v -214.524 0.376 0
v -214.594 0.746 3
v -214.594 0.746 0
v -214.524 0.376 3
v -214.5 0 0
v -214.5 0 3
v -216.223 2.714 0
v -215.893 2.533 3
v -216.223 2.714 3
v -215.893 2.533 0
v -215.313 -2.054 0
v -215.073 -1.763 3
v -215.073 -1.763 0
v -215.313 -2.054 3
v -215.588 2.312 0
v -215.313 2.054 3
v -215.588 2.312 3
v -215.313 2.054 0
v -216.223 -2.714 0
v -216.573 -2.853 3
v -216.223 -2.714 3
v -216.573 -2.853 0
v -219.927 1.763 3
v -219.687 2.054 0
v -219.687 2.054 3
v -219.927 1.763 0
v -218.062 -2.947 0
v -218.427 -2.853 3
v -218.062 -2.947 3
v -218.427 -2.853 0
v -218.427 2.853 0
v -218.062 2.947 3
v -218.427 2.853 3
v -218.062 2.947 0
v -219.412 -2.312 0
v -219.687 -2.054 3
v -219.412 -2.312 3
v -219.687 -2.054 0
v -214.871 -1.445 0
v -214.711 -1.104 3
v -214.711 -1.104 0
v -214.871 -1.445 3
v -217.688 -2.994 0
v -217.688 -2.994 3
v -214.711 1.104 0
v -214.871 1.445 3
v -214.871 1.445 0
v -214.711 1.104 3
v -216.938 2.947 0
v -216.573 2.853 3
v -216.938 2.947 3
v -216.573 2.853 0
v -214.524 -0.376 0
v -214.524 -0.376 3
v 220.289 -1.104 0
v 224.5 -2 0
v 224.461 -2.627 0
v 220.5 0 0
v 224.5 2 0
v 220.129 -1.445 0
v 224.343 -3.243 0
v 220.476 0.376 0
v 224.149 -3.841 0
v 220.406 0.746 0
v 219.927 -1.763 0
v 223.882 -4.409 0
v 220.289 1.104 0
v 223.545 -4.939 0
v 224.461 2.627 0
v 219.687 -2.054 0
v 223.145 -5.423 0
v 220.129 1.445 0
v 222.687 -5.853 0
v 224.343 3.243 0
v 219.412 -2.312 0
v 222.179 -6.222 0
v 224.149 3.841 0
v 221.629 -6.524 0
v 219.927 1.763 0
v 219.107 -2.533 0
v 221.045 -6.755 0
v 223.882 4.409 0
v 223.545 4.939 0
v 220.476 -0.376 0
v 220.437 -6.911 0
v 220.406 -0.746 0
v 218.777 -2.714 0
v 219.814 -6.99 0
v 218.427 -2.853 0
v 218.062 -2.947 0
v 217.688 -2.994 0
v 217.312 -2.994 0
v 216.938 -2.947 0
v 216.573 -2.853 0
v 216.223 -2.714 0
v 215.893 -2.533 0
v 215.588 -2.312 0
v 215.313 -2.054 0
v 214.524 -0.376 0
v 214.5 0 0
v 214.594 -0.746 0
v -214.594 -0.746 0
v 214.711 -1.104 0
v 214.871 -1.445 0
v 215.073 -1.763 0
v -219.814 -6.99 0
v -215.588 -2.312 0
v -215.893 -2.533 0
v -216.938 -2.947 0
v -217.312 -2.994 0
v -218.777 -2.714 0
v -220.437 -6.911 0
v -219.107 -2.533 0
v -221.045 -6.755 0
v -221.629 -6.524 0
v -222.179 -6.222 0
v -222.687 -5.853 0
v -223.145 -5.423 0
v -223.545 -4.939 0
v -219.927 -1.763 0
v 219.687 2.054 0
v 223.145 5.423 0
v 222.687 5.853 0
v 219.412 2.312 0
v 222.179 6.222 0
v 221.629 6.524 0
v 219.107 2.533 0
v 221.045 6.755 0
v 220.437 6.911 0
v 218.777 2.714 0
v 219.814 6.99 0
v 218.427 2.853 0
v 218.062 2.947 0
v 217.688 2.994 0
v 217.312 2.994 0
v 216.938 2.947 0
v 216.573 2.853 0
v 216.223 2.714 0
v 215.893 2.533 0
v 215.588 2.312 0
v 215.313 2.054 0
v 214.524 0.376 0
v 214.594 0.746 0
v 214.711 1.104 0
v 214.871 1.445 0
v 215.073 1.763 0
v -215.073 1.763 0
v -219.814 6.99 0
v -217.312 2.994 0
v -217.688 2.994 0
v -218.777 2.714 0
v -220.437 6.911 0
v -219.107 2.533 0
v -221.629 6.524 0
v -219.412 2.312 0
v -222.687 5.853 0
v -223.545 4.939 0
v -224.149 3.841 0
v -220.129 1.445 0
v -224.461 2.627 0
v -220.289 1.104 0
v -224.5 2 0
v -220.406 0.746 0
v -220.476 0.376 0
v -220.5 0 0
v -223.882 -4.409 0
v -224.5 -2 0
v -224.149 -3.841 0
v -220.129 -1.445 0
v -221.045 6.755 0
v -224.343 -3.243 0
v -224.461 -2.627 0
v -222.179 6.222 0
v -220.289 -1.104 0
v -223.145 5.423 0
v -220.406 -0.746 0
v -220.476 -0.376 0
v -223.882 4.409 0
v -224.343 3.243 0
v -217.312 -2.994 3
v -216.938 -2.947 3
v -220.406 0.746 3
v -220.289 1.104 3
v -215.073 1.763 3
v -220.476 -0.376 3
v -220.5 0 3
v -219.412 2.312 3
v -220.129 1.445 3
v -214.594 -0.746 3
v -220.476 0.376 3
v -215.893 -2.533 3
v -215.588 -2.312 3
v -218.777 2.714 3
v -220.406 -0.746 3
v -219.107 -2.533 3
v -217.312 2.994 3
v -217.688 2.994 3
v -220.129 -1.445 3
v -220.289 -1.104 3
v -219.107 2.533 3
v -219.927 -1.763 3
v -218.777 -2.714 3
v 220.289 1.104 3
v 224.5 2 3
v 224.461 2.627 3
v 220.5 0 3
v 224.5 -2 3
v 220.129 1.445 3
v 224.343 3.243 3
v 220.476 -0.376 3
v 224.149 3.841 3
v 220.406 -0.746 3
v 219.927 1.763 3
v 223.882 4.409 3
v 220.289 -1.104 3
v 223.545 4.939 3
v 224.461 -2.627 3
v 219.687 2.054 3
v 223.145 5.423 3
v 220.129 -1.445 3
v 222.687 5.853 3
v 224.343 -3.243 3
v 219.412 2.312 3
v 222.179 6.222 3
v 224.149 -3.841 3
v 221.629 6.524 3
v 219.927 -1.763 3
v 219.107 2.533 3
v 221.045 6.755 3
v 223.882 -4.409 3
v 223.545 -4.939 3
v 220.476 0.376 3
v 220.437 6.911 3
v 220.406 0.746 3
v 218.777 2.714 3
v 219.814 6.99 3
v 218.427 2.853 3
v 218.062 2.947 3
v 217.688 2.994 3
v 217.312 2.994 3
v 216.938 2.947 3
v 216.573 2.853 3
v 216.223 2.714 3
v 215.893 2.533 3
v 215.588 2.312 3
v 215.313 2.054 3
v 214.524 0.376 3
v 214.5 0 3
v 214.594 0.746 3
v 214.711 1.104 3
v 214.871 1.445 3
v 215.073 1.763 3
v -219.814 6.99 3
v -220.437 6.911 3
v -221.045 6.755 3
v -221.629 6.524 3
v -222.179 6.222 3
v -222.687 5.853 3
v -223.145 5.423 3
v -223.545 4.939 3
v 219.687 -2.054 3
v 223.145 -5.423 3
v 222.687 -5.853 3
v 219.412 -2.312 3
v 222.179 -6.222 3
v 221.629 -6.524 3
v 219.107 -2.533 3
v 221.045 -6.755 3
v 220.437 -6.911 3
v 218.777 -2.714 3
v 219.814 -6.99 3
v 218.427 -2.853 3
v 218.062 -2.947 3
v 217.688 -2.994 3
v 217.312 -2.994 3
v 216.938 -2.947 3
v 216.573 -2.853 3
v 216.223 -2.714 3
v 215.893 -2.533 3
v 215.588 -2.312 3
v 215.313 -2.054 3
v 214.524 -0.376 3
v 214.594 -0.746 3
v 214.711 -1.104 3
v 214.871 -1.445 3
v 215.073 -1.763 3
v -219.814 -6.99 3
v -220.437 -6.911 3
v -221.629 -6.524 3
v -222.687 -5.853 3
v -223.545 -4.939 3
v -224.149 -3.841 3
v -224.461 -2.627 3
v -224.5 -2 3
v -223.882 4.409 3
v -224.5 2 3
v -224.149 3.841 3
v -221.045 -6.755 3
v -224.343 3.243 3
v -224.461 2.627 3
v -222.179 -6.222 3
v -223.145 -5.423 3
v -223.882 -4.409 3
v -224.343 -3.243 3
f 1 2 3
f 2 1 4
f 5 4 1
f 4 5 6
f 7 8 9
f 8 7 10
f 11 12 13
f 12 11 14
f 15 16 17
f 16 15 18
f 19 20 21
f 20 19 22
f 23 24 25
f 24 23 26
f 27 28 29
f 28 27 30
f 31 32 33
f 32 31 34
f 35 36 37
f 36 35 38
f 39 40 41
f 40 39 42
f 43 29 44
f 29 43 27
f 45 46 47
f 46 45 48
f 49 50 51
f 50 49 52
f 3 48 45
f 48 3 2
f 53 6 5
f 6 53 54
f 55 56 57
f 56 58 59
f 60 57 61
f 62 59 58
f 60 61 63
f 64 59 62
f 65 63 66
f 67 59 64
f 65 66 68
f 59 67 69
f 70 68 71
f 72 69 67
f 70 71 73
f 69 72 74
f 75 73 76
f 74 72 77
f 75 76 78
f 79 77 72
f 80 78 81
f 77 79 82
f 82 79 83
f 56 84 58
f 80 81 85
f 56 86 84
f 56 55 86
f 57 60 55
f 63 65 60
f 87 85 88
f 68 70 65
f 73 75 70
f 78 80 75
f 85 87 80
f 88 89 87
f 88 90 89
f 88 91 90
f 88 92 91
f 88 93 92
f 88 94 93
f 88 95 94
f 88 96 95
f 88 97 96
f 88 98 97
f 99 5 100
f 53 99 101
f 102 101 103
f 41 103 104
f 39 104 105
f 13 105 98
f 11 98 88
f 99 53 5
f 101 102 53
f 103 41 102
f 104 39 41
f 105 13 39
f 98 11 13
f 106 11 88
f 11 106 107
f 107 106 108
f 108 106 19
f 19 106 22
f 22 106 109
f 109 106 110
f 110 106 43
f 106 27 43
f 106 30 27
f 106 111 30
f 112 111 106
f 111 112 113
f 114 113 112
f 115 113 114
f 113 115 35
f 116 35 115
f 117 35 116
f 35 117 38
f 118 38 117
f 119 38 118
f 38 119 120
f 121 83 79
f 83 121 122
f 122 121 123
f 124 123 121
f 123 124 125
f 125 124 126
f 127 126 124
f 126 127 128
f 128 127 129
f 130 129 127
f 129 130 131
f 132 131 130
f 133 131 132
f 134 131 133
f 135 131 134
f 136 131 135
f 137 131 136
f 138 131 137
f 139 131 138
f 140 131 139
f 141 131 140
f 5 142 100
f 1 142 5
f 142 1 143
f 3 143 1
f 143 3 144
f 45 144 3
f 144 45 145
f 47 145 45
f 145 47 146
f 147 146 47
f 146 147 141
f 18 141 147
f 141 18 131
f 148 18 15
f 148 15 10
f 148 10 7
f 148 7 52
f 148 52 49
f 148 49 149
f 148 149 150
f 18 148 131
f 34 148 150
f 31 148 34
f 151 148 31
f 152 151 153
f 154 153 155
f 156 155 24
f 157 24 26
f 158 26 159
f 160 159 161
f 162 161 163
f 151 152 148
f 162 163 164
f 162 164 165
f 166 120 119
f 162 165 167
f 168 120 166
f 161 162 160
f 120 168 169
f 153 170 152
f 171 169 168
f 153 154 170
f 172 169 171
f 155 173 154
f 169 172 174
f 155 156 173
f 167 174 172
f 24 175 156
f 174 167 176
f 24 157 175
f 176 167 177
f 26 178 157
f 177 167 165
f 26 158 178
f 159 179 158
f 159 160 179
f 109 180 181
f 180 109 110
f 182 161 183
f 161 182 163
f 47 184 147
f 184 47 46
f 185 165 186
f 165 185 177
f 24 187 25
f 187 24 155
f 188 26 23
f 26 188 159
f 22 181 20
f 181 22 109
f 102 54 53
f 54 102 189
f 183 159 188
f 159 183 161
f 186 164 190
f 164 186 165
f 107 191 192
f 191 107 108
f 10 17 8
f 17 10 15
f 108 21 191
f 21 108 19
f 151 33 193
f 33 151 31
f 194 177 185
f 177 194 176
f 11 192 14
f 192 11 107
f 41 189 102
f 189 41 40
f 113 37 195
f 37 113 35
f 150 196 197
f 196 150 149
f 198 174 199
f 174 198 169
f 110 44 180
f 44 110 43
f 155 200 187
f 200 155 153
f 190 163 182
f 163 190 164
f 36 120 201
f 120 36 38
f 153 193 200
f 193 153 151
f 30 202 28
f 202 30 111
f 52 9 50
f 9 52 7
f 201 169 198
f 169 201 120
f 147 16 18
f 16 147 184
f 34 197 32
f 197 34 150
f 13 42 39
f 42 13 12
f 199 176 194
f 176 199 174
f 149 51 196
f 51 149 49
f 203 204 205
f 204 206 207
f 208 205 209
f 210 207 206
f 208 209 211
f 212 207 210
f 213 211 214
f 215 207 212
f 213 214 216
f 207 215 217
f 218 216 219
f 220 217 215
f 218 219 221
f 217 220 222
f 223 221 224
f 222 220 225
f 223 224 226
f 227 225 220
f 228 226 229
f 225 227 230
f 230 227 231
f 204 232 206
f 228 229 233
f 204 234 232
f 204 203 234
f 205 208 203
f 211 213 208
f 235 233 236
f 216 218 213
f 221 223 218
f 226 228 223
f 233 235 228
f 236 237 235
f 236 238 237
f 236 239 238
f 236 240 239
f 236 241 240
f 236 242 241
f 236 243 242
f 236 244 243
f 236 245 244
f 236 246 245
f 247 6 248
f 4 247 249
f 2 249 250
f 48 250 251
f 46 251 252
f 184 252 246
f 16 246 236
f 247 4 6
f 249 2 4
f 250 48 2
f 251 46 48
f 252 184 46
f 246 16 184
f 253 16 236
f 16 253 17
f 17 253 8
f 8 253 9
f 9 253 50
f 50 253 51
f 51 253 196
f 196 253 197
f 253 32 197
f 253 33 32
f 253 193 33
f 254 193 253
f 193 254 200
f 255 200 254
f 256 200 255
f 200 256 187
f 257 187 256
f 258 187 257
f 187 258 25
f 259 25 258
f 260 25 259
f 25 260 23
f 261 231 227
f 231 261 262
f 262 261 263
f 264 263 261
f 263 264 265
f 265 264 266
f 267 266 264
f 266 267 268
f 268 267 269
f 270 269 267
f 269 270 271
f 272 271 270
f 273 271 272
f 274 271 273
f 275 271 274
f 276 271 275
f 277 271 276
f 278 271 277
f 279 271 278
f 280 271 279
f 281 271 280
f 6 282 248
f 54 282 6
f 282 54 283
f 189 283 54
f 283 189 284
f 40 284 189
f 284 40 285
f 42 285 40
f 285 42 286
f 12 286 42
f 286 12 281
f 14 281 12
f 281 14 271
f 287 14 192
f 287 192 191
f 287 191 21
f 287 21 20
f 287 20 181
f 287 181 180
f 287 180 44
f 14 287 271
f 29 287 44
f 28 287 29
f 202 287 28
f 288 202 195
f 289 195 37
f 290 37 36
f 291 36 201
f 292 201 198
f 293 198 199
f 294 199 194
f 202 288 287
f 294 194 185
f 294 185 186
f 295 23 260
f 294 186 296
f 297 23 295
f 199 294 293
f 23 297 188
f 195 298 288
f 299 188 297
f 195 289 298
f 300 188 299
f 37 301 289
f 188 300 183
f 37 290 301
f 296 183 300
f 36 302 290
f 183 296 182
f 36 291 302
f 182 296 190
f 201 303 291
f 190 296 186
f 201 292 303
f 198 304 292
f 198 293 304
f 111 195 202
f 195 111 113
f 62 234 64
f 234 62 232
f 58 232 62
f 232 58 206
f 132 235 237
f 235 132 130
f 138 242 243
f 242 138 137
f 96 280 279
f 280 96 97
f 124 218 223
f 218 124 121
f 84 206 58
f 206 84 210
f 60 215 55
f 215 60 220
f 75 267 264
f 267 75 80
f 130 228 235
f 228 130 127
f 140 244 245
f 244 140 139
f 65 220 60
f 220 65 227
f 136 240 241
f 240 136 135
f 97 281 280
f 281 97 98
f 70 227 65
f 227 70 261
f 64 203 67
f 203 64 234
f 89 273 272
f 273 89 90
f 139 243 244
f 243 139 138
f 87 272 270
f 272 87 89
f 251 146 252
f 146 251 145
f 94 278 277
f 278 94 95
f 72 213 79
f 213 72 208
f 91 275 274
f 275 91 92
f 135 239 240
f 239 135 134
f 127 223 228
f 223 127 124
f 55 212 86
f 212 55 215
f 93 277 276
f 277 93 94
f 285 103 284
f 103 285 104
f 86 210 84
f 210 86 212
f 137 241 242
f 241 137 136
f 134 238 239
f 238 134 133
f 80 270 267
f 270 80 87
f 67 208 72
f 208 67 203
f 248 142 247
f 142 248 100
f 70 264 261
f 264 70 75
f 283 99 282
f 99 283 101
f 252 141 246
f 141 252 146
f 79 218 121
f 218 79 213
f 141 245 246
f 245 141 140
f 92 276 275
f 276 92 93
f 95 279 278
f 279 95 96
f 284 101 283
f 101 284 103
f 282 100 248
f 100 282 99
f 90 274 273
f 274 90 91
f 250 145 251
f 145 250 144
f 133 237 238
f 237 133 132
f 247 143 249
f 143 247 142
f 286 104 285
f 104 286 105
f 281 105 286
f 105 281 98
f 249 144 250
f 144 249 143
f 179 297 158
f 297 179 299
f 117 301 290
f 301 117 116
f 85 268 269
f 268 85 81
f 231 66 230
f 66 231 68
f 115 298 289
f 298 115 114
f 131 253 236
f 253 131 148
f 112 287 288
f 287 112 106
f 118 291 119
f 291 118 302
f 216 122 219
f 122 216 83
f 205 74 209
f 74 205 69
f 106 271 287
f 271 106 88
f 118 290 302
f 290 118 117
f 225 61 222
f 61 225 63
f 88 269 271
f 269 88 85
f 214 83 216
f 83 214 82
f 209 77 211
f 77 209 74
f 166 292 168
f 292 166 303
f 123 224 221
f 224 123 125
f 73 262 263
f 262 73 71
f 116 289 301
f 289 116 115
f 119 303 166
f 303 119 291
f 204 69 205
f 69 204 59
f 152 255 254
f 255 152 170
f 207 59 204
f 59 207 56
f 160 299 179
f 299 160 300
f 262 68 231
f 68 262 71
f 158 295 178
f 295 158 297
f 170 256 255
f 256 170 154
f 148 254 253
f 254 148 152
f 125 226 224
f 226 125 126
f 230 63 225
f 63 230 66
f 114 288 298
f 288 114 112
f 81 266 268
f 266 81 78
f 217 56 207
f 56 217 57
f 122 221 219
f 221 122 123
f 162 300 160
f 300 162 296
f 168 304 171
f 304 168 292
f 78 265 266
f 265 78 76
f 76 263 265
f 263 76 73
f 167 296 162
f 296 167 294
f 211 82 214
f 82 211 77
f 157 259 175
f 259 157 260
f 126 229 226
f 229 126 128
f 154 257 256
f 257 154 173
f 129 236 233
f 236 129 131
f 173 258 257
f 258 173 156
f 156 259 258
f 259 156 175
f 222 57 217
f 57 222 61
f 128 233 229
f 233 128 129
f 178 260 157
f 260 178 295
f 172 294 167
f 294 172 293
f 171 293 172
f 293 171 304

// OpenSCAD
$fn = 50;


difference() {
	union() {
		hull() {
			translate(v = [-219.5000000000, 2.0000000000, 0]) {
				cylinder(h = 3, r = 5);
			}
			translate(v = [219.5000000000, 2.0000000000, 0]) {
				cylinder(h = 3, r = 5);
			}
			translate(v = [-219.5000000000, -2.0000000000, 0]) {
				cylinder(h = 3, r = 5);
			}
			translate(v = [219.5000000000, -2.0000000000, 0]) {
				cylinder(h = 3, r = 5);
			}
		}
	}
	union() {
		translate(v = [-217.5000000000, 0.0000000000, 0]) {
			cylinder(h = 3, r = 3.0000000000);
		}
		translate(v = [217.5000000000, 0.0000000000, 0]) {
			cylinder(h = 3, r = 3.0000000000);
		}
		translate(v = [-217.5000000000, 0.0000000000, 0]) {
			cylinder(h = 3, r = 1.5000000000);
		}
		translate(v = [217.5000000000, 0.0000000000, 0]) {
			cylinder(h = 3, r = 1.5000000000);
		}
		translate(v = [-217.5000000000, 0.0000000000, 0]) {
			cylinder(h = 3, r = 1.5000000000);
		}
		translate(v = [217.5000000000, 0.0000000000, 0]) {
			cylinder(h = 3, r = 1.5000000000);
		}
		translate(v = [-217.5000000000, 0.0000000000, 0]) {
			cylinder(h = 3, r = 1.5000000000);
		}
		translate(v = [217.5000000000, 0.0000000000, 0]) {
			cylinder(h = 3, r = 1.5000000000);
		}
	}
}
